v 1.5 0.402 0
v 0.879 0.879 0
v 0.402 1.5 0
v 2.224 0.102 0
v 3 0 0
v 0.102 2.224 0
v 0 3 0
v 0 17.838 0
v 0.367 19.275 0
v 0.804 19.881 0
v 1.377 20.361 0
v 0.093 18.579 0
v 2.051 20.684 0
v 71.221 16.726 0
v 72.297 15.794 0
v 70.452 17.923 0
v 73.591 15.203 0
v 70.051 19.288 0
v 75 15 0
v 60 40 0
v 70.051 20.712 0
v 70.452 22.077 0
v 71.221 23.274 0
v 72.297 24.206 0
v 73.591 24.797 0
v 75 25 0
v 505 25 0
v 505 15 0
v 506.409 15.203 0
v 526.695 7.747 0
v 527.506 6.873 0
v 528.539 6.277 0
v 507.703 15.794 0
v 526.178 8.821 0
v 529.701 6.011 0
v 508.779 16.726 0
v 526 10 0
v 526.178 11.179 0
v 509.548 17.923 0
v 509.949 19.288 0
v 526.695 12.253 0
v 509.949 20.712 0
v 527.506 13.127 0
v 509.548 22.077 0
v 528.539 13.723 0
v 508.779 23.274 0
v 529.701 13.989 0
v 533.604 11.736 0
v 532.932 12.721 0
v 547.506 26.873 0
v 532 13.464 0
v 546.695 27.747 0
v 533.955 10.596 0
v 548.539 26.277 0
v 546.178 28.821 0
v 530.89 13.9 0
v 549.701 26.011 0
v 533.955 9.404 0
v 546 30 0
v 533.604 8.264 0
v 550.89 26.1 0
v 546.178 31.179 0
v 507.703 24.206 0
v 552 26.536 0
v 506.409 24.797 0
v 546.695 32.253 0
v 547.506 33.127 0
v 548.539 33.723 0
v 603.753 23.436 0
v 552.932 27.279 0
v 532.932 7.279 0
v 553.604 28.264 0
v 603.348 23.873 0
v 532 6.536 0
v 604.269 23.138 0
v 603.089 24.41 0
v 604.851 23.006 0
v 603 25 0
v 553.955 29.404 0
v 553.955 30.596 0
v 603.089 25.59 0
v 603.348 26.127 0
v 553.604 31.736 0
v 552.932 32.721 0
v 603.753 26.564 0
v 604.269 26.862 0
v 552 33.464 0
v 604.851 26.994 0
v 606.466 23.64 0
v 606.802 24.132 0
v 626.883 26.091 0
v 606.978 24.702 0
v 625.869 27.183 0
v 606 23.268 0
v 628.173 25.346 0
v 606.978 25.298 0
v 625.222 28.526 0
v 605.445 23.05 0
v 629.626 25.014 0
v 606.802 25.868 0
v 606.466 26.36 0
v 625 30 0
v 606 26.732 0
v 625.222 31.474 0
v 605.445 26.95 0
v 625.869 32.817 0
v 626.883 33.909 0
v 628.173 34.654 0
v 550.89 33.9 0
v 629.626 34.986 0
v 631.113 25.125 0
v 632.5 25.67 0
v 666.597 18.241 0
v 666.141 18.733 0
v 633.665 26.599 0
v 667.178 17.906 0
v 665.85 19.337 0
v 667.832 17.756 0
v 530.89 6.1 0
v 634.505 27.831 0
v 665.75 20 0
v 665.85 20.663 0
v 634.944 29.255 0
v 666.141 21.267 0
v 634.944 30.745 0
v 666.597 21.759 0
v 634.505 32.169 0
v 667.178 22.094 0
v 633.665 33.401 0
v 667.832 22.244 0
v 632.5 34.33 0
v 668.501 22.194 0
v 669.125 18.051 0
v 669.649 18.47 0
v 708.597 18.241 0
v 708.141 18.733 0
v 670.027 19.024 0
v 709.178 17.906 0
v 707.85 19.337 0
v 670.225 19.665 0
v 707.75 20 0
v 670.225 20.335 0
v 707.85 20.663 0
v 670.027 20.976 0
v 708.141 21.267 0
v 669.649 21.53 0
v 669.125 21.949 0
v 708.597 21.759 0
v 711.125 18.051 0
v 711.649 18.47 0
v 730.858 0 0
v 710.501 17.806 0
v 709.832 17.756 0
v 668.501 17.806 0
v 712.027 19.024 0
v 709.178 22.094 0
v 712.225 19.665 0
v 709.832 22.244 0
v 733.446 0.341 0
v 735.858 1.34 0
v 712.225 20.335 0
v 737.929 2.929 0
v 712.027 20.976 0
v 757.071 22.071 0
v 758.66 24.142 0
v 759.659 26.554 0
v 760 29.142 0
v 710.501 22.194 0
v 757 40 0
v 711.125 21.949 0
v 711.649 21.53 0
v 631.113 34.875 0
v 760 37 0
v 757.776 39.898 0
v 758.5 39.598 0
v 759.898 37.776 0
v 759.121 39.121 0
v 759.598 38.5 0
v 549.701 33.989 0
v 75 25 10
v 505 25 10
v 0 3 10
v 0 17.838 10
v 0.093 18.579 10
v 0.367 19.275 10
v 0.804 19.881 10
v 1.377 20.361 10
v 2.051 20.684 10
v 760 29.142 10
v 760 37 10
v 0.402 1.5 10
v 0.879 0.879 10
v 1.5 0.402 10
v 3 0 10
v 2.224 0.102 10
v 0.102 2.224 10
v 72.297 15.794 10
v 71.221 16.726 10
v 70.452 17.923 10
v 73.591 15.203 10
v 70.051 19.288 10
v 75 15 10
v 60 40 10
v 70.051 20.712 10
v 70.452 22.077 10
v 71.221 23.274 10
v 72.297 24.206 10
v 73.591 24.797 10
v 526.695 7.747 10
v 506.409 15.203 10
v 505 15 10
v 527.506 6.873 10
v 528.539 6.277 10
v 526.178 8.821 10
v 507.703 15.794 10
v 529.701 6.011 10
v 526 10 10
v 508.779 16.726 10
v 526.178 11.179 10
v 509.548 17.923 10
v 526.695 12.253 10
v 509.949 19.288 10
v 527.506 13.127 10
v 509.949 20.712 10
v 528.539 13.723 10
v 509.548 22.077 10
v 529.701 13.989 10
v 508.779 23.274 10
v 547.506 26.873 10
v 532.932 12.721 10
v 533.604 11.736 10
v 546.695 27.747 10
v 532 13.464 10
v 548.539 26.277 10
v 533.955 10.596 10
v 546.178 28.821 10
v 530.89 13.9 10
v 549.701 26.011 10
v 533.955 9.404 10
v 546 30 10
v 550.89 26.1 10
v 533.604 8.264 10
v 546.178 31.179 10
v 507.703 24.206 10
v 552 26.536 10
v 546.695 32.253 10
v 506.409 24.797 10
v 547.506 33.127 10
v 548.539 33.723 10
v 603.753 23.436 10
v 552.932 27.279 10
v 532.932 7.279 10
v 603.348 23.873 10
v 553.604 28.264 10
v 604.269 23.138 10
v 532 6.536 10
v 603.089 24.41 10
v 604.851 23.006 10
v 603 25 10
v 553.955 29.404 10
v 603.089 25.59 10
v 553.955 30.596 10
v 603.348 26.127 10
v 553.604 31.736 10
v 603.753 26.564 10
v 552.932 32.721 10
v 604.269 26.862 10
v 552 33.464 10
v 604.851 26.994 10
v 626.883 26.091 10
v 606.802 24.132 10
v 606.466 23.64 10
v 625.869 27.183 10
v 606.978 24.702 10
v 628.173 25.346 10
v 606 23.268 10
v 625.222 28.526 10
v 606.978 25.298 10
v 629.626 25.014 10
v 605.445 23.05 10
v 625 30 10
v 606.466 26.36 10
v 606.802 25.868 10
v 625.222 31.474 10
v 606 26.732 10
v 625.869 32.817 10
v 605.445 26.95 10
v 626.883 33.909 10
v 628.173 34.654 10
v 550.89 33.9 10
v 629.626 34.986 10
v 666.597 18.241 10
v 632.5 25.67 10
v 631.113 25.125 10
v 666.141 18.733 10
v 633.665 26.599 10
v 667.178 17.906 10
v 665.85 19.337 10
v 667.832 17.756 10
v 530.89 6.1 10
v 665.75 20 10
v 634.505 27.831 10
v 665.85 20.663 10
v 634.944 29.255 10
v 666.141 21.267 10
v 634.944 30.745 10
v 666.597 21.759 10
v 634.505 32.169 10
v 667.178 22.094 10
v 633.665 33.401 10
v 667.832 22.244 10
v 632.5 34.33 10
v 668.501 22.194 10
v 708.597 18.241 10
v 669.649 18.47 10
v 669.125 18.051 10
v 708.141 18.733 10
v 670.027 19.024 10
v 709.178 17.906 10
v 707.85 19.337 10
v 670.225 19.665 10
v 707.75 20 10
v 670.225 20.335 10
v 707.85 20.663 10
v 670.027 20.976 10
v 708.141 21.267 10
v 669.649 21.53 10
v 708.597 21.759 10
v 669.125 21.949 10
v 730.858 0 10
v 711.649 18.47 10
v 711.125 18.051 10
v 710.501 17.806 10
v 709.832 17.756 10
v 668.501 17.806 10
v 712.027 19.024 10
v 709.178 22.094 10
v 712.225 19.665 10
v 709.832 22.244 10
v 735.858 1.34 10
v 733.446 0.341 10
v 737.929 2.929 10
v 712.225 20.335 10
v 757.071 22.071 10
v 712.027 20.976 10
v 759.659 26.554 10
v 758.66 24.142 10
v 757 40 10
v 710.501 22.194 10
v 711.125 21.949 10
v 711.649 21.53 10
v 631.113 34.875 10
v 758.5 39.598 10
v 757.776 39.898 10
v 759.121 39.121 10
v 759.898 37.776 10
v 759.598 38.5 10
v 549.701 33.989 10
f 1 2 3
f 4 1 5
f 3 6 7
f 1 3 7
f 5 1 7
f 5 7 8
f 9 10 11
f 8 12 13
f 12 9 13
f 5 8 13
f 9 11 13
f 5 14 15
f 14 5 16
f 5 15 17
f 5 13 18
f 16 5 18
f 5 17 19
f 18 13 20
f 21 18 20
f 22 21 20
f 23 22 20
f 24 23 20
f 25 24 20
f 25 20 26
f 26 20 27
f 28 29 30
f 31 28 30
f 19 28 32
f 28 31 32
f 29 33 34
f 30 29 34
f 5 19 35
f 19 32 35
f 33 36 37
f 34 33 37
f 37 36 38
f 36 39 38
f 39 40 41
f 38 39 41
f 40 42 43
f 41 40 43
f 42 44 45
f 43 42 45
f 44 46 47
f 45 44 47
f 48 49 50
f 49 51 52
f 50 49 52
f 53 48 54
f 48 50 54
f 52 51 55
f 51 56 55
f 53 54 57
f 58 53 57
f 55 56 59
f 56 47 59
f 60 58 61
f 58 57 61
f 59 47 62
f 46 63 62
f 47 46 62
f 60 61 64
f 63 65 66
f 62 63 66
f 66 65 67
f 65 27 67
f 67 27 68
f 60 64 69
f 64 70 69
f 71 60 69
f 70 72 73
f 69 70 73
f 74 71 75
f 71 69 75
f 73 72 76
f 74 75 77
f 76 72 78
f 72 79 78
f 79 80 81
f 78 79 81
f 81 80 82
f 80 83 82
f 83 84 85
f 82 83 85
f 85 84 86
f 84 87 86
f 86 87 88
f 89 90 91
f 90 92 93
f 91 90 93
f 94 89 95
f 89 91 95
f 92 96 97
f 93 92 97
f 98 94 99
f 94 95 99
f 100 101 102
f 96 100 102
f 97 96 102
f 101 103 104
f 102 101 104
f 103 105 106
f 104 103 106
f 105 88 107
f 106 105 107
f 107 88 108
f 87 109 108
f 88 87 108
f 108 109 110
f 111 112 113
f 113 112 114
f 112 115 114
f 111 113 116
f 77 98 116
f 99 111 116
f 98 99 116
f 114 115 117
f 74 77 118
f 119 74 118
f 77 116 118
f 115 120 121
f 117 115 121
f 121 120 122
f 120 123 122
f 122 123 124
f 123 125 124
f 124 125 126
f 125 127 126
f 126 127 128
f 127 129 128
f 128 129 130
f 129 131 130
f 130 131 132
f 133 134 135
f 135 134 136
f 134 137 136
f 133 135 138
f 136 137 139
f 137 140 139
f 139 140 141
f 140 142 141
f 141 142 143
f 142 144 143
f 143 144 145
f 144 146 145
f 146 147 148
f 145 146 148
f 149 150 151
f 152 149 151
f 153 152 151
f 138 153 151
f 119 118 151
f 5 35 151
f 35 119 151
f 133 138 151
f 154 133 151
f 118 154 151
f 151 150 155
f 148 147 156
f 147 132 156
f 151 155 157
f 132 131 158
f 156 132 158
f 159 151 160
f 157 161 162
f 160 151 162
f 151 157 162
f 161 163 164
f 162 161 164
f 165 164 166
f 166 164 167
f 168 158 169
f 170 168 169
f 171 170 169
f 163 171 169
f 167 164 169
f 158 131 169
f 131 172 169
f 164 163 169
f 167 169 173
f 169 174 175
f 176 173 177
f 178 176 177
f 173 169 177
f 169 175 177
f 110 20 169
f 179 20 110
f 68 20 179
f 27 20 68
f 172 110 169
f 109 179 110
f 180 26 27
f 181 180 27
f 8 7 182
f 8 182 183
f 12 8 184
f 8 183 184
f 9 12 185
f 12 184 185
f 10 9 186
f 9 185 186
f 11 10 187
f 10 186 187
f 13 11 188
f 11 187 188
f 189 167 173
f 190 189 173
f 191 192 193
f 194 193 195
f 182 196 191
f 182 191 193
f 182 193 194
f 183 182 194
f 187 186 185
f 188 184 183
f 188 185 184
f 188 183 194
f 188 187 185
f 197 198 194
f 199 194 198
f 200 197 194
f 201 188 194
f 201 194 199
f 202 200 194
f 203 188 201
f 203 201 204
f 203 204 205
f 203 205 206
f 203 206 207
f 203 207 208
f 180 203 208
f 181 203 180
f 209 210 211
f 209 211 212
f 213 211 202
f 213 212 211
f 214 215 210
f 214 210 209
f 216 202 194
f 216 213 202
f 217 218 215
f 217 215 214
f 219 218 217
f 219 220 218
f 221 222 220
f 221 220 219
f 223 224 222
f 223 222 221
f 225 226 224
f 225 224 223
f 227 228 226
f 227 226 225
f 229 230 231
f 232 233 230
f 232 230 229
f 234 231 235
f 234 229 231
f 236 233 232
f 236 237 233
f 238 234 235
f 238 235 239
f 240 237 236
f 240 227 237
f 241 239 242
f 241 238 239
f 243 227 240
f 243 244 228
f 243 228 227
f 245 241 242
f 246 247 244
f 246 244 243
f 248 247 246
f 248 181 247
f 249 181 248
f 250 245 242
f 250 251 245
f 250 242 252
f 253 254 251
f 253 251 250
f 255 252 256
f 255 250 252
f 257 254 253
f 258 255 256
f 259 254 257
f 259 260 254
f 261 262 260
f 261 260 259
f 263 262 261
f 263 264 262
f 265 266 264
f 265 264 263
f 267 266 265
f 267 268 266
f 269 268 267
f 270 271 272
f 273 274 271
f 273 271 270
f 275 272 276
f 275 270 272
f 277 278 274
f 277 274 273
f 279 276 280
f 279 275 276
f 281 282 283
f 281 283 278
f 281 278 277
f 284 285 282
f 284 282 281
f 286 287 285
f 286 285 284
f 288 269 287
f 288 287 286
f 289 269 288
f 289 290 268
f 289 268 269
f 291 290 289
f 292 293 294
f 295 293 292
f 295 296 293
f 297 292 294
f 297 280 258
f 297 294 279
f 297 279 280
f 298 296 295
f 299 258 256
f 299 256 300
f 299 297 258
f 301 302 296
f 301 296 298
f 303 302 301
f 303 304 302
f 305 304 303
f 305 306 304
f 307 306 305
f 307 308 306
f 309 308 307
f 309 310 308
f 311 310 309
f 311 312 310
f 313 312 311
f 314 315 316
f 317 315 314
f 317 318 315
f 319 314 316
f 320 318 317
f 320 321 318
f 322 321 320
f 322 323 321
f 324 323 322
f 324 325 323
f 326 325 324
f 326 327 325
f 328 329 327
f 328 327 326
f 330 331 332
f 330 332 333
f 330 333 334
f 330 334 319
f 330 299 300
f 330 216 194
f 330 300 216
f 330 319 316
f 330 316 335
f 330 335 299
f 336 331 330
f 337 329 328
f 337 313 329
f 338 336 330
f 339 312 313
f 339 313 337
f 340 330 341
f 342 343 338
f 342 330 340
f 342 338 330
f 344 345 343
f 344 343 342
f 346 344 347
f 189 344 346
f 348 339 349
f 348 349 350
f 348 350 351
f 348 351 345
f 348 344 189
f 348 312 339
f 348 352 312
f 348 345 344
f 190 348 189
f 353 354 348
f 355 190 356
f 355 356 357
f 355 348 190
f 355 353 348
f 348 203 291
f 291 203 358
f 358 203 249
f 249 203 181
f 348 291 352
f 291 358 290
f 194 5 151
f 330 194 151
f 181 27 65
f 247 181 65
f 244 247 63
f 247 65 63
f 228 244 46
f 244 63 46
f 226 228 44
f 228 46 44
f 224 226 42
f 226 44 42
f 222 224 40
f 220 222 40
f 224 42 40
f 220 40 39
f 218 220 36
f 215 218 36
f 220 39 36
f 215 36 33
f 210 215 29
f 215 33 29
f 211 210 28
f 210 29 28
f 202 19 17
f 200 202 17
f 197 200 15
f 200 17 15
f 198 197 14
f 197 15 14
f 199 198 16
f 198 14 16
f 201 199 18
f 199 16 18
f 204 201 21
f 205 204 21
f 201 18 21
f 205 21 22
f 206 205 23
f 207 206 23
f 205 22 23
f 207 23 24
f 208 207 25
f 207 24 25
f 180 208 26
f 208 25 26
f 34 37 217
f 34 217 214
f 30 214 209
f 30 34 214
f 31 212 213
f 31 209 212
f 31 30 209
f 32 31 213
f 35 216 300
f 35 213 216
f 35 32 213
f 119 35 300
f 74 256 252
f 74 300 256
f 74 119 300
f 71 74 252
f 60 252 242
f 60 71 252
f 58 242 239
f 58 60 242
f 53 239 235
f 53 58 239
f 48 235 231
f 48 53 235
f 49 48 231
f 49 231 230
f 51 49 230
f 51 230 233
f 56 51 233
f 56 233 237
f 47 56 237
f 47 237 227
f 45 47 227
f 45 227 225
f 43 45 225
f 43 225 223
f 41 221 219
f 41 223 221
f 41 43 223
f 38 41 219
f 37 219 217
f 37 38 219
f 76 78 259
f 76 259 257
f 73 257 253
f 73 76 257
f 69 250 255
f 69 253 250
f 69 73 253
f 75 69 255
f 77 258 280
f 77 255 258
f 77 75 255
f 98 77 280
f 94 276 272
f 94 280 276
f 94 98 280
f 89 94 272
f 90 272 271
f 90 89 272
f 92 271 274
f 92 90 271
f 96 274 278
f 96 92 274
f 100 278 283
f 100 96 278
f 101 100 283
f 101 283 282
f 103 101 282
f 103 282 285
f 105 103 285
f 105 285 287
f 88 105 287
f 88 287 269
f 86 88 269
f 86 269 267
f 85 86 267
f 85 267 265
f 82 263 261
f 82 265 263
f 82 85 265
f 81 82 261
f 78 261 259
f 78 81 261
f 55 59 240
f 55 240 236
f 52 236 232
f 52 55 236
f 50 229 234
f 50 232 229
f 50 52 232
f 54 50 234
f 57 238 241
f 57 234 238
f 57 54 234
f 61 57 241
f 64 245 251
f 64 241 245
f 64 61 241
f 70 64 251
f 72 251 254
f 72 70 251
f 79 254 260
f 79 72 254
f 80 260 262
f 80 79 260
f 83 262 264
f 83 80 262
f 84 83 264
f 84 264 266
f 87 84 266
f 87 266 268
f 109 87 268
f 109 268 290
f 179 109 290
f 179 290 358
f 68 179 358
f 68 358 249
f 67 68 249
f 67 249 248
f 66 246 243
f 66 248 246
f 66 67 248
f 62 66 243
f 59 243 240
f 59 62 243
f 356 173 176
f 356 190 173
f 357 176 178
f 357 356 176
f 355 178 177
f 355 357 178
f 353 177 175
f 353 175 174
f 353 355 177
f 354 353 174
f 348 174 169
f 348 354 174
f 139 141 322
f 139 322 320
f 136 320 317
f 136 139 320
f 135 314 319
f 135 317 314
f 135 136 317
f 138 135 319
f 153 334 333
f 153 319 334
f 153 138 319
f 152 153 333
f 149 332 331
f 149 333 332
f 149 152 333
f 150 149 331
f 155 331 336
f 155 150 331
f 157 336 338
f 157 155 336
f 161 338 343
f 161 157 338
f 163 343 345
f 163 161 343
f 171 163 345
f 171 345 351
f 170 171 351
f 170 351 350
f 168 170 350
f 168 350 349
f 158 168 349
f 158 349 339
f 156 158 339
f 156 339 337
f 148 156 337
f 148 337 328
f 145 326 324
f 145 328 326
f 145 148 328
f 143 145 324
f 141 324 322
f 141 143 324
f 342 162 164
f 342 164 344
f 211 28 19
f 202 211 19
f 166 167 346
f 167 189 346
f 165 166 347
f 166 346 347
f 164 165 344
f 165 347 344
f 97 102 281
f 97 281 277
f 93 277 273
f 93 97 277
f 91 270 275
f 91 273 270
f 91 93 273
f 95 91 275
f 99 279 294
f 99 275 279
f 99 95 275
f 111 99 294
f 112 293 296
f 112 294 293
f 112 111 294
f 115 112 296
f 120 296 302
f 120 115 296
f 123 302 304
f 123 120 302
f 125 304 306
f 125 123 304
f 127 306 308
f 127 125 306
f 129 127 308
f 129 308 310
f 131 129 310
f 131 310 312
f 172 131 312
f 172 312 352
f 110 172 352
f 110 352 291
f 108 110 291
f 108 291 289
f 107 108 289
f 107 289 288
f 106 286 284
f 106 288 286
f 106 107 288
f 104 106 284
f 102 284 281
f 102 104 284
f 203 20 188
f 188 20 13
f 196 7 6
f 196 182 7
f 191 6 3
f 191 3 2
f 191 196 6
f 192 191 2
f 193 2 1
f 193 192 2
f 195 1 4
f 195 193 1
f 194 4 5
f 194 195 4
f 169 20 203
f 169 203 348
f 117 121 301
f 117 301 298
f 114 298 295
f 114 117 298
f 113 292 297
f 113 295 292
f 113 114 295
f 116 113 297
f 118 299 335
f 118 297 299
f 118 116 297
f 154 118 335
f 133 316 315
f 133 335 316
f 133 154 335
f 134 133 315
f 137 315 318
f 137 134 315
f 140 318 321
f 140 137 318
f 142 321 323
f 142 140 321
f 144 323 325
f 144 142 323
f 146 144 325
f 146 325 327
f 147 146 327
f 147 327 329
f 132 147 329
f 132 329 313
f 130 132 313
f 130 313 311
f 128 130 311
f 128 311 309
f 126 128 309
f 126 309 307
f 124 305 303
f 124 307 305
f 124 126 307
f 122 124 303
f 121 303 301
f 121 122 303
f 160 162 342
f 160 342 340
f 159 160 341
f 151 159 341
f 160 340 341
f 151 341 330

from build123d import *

# Parameters (mm, degrees)
ESQUISSE1_W                  = 760
ESQUISSE1_H                  = 40
BOSS_EXTRU_1_DEPTH           = 10
ENL_V_MAT_EXTRU_1_DEPTH      = 762.117599324
ENL_V_MAT_EXTRU_1_DEPTH_BACK = 762.117599324
ENL_V_MAT_EXTRU_2_DEPTH      = 762.117599324
ENL_V_MAT_EXTRU_2_DEPTH_BACK = 762.117599324
ENL_V_MAT_EXTRU_3_DEPTH      = 762.117599324
ENL_V_MAT_EXTRU_3_DEPTH_BACK = 762.117599324
ESQUISSE4_R                  = 4
CONG_1_R                     = 3
CHANFREIN1_SIZE              = 25
ENL_V_MAT_EXTRU_4_DEPTH      = 762.117599324
ENL_V_MAT_EXTRU_4_DEPTH_BACK = 762.117599324
ESQUISSE5_R                  = 2.25
ESQUISSE5_R_2                = 5
ESQUISSE5_R_3                = 2
CONG_2_R                     = 3
CONG_3_R                     = 10


with BuildPart() as part:
    # Esquisse1 → Boss.-Extru.1 (new body)
    with BuildSketch(Plane.XY):
        with Locations((380, 20)):
            Rectangle(ESQUISSE1_W, ESQUISSE1_H)
    extrude(amount=BOSS_EXTRU_1_DEPTH)

    # Esquisse2 → Enlèv. mat.-Extru.1 (cut, two sides: drawn at the far end of the back side and taken through both)
    with BuildSketch(Plane.XY.offset(10).offset(-ENL_V_MAT_EXTRU_1_DEPTH_BACK)):
        Polygon((0, 40), (60, 40), (0, 20), align=None)
    extrude(amount=ENL_V_MAT_EXTRU_1_DEPTH + ENL_V_MAT_EXTRU_1_DEPTH_BACK, mode=Mode.SUBTRACT)

    # Esquisse3 → Enlèv. mat.-Extru.2 (cut, two sides: drawn at the far end of the back side and taken through both)
    with BuildSketch(Plane.XY.offset(10).offset(-ENL_V_MAT_EXTRU_2_DEPTH_BACK)):
        with BuildLine():
            Line((75, 25), (505, 25))
            ThreePointArc((505, 25), (510, 20), (505, 15))
            Line((505, 15), (75, 15))
            ThreePointArc((75, 15), (70, 20), (75, 25))
        make_face()
    extrude(amount=ENL_V_MAT_EXTRU_2_DEPTH + ENL_V_MAT_EXTRU_2_DEPTH_BACK, mode=Mode.SUBTRACT)

    # Esquisse4 → Enlèv. mat.-Extru.3 (cut, two sides: drawn at the far end of the back side and taken through both)
    with BuildSketch(Plane.XY.offset(10).offset(-ENL_V_MAT_EXTRU_3_DEPTH_BACK)):
        with Locations(Location((530, 10, 0), (0, 0, 180))):
            Circle(ESQUISSE4_R)
        with Locations(Location((550, 30, 0), (0, 0, 180))):
            Circle(ESQUISSE4_R)
    extrude(amount=ENL_V_MAT_EXTRU_3_DEPTH + ENL_V_MAT_EXTRU_3_DEPTH_BACK, mode=Mode.SUBTRACT)

    # Congé1
    cong_1_edges = [part.edges().sort_by_distance(p)[0] for p in [
        (0, 20, 5),
        (0, 0, 5),
    ]]
    fillet(cong_1_edges, radius=CONG_1_R)

    # Chanfrein1
    chanfrein1_edges = [part.edges().sort_by_distance(p)[0] for p in [
        (760, 0, 5),
    ]]
    chamfer(chanfrein1_edges, length=CHANFREIN1_SIZE)

    # Esquisse5 → Enlèv. mat.-Extru.4 (cut, two sides: drawn at the far end of the back side and taken through both)
    with BuildSketch(Plane.XY.offset(10).offset(-ENL_V_MAT_EXTRU_4_DEPTH_BACK)):
        with Locations(Location((710, 20, 0), (0, 0, 180))):
            Circle(ESQUISSE5_R)
        with Locations(Location((668, 20, 0), (0, 0, 180))):
            Circle(ESQUISSE5_R)
        with Locations(Location((630, 30, 0), (0, 0, 180))):
            Circle(ESQUISSE5_R_2)
        with Locations(Location((605, 25, 0), (0, 0, 180))):
            Circle(ESQUISSE5_R_3)
    extrude(amount=ENL_V_MAT_EXTRU_4_DEPTH + ENL_V_MAT_EXTRU_4_DEPTH_BACK, mode=Mode.SUBTRACT)

    # Congé2
    cong_2_edges = [part.edges().sort_by_distance(p)[0] for p in [
        (760, 40, 5),
    ]]
    fillet(cong_2_edges, radius=CONG_2_R)

    # Congé3
    cong_3_edges = [part.edges().sort_by_distance(p)[0] for p in [
        (760, 25, 5),
        (735, 0, 5),
    ]]
    fillet(cong_3_edges, radius=CONG_3_R)


solid = part.part
